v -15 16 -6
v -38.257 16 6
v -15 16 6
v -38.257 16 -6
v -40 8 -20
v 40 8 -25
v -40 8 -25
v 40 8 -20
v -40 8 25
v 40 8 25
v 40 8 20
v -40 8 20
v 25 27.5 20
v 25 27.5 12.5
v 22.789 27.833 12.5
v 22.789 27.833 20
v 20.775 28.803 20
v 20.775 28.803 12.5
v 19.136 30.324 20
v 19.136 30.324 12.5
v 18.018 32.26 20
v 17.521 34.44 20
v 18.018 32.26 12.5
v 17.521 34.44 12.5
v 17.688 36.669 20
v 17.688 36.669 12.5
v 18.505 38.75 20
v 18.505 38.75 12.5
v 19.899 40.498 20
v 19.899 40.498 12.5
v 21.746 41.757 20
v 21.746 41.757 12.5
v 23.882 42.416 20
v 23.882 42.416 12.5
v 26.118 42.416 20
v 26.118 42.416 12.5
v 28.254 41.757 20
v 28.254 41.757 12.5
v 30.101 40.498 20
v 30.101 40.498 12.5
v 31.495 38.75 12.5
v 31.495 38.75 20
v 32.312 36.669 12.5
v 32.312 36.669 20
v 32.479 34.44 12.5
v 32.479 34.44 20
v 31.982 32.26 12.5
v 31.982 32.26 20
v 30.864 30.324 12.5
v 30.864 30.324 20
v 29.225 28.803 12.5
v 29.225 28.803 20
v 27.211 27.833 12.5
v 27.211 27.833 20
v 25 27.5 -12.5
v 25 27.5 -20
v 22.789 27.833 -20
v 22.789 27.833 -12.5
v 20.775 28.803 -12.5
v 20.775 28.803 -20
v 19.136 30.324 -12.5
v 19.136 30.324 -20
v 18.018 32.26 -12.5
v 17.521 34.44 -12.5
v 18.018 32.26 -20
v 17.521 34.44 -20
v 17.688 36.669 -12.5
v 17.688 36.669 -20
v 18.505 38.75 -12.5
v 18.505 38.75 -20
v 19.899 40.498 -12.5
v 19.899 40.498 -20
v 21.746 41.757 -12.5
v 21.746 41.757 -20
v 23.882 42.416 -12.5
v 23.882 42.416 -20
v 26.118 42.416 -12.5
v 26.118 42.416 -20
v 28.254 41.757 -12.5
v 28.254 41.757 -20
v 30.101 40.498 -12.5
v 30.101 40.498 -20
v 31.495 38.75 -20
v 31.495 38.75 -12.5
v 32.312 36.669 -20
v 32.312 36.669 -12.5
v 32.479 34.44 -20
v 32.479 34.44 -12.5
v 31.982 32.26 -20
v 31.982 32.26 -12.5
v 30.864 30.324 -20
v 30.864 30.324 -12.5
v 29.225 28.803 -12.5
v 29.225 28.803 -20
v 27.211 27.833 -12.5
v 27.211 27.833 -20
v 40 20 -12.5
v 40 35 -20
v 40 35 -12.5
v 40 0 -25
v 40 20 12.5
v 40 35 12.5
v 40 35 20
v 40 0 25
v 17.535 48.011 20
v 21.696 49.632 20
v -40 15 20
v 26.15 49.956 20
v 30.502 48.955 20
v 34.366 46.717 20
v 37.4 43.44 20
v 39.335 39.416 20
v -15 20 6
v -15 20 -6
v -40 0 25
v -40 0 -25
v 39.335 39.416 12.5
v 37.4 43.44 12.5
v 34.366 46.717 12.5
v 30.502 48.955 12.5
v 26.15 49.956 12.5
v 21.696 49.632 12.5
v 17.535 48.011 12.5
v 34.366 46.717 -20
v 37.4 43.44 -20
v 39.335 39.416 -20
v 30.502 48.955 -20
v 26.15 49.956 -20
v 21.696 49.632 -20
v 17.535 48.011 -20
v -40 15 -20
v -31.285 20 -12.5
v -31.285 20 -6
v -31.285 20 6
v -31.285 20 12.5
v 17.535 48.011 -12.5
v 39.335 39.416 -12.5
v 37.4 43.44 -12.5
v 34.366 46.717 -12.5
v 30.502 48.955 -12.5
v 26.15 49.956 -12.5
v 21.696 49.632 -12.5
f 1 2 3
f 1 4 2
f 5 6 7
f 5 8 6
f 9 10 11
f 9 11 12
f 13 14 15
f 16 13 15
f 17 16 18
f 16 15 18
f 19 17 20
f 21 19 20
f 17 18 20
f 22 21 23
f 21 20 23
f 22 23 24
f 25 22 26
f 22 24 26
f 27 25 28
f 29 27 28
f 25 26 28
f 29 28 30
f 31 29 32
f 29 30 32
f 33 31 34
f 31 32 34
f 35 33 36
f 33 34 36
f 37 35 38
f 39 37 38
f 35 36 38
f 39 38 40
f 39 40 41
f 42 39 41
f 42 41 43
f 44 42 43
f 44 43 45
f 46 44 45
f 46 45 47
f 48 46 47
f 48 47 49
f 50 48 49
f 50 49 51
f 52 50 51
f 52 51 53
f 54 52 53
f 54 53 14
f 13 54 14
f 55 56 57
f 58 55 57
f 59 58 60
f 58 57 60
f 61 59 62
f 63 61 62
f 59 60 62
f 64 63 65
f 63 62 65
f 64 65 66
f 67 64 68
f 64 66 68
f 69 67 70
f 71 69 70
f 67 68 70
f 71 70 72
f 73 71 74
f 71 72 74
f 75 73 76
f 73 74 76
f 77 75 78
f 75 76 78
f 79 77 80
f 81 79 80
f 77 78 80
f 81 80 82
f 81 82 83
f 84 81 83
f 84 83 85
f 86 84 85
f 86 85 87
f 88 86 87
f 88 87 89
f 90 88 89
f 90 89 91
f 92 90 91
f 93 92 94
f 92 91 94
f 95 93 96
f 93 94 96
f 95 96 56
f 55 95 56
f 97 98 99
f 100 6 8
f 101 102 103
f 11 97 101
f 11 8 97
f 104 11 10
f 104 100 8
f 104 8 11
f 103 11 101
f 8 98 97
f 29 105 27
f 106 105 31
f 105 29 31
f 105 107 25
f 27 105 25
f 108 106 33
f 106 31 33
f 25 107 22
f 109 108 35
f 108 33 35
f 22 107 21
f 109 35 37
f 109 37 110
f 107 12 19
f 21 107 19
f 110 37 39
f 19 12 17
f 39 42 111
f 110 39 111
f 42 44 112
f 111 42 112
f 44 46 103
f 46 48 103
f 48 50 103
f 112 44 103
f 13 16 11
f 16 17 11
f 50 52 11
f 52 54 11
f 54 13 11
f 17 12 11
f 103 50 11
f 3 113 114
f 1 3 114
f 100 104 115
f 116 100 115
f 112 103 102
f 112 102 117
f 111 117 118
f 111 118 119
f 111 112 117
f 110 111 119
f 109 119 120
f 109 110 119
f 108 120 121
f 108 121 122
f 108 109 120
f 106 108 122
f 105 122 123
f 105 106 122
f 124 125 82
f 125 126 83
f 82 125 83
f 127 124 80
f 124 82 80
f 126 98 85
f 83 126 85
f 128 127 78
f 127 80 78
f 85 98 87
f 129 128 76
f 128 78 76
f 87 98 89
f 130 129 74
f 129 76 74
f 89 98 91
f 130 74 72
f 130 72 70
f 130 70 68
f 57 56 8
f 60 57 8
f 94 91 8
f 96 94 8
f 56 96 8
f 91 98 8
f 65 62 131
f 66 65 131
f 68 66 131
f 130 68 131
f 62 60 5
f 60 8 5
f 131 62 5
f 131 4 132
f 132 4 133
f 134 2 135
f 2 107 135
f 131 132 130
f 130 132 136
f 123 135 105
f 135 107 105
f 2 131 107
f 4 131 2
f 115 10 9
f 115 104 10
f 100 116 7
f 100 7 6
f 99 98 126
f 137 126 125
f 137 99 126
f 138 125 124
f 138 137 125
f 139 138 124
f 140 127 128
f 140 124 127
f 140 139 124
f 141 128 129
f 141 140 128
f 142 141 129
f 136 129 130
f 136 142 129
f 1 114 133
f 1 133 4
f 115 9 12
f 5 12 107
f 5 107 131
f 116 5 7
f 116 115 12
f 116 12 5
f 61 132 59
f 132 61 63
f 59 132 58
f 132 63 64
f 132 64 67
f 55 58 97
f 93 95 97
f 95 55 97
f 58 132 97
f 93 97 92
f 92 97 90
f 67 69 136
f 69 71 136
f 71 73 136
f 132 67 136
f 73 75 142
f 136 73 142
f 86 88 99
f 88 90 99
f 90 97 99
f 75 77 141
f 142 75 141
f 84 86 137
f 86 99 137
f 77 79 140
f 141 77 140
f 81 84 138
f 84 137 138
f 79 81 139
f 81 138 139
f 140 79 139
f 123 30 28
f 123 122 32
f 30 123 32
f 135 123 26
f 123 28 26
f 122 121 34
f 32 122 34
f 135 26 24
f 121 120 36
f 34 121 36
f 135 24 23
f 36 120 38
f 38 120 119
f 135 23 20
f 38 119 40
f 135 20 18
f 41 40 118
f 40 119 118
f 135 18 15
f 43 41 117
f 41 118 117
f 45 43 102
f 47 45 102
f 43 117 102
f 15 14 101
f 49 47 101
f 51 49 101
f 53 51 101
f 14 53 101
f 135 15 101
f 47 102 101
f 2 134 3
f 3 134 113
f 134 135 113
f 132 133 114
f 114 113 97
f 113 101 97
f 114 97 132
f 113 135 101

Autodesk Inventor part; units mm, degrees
ref_plane "YZ Plane" through (0, 0, 0) normal (1, 0, 0) x (0, 1, 0)
ref_plane "XZ Plane" through (0, 0, 0) normal (0, 1, 0) x (-1, 0, 0)
ref_plane "XY Plane" through (0, 0, 0) normal (0, 0, 1) x (1, 0, 0)
sketch "Szkic1" plane through (0, 0, 0) normal (0, 1, 0) x (-1, 0, 0)
  line L0 (40, -25) -> (-40, -25)
  line L1 (-40, -25) -> (-40, 25)
  line L2 (-40, 25) -> (40, 25)
  line L3 (40, 25) -> (40, -25)
  point P0 (0, 0)
  dimension "d0" = 80
  dimension "d1" = 50
extrude "Wyciągnięcie proste1" add sketch "Szkic1" along normal blind 8
sketch "Szkic2" plane through (0, 8, 0) normal (0, 1, 0) x (1, 0, 0)
  line L0 (40, -25) -> (40, 25) projected
  line L1 (-40, -20) -> (40, -20)
  line L2 (40, -20) -> (40, 20)
  line L3 (40, 20) -> (-40, 20)
  line L4 (-40, 20) -> (-40, -20)
  line L5 (-40, -20) -> (40, 20) construction
  line L6 (40, -20) -> (-40, 20) construction
  point P0 (0, 0)
  dimension "d4" = 40
extrude "Wyciągnięcie proste2" add sketch "Szkic2" along normal blind 42
sketch "Szkic3" plane through (-40, 8, 20) normal (0, 0, 1) x (1, 0, 0)
  line L0 (0, 0) -> (0, 42) projected
  line L1 (0, 0) -> (0, 7)
  circle A0 centre (65, 27) radius 15
  line L2 (80, 0) -> (80, 42) projected
  line L3 (0, 42) -> (80, 42) projected
  line L4 (0, 7) -> (57.5352, 40.0106)
  point P0 (40, -8)
  point P1 (65, 42)
  point P2 (80, 27)
  dimension "d8" = 30
  dimension "d7" = 7
extrude "Wyciągnięcie proste3" cut sketch "Szkic3" against normal through all contours L0 L3 A0 L4 | L3 L2 A0
sketch "Szkic4" plane through (40, 0, 25) normal (1, 0, 0) x (0, 0, -1)
  line L0 (12.5, 20) -> (37.5, 20)
  line L1 (37.5, 20) -> (37.5, 50)
  line L2 (37.5, 50) -> (12.5, 50)
  line L3 (12.5, 50) -> (12.5, 20)
  line L4 (12.5, 20) -> (37.5, 50) construction
  line L5 (37.5, 20) -> (12.5, 50) construction
  line L6 (0, 0) -> (50, 0) projected
  point P0 (25, 0)
  point P1 (25, 35)
  dimension "d11" = 25
  dimension "d12" = 30
  dimension "d13" = 20
sketch "Szkic5" plane through (-40, 8, 20) normal (0, 0, 1) x (1, 0, 0)
  arc A0 (80, 27) -> (57.5352, 40.0106) centre (65, 27) ccw projected
  point P0 (40, -8)
extrude "Wyciągnięcie proste4" cut sketch "Szkic4" against normal through all
sketch "Szkic6" plane through (40, 20, 12.5) normal (0, 1, 0) x (1, 0, 0)
  line L0 (-55, 18.5) -> (-80, 18.5)
  line L1 (-80, 18.5) -> (-80, 6.5)
  line L2 (-80, 6.5) -> (-55, 6.5)
  line L3 (-55, 6.5) -> (-55, 18.5)
  line L4 (-55, 18.5) -> (-80, 6.5) construction
  line L5 (-80, 18.5) -> (-55, 6.5) construction
  line L6 (0, 25) -> (0, 0) projected
  point P0 (-40, 12.5)
  point P1 (-67.5, 12.5)
  point P2 (-55, 12.5)
  dimension "d16" = 25
  dimension "d17" = 55
  dimension "d18" = 12
extrude "Wyciągnięcie proste5" cut sketch "Szkic6" against normal blind 4
hole "Otwór1" at (25, 35, 20) direction (0, 0, -1) diameter 15 end through all
